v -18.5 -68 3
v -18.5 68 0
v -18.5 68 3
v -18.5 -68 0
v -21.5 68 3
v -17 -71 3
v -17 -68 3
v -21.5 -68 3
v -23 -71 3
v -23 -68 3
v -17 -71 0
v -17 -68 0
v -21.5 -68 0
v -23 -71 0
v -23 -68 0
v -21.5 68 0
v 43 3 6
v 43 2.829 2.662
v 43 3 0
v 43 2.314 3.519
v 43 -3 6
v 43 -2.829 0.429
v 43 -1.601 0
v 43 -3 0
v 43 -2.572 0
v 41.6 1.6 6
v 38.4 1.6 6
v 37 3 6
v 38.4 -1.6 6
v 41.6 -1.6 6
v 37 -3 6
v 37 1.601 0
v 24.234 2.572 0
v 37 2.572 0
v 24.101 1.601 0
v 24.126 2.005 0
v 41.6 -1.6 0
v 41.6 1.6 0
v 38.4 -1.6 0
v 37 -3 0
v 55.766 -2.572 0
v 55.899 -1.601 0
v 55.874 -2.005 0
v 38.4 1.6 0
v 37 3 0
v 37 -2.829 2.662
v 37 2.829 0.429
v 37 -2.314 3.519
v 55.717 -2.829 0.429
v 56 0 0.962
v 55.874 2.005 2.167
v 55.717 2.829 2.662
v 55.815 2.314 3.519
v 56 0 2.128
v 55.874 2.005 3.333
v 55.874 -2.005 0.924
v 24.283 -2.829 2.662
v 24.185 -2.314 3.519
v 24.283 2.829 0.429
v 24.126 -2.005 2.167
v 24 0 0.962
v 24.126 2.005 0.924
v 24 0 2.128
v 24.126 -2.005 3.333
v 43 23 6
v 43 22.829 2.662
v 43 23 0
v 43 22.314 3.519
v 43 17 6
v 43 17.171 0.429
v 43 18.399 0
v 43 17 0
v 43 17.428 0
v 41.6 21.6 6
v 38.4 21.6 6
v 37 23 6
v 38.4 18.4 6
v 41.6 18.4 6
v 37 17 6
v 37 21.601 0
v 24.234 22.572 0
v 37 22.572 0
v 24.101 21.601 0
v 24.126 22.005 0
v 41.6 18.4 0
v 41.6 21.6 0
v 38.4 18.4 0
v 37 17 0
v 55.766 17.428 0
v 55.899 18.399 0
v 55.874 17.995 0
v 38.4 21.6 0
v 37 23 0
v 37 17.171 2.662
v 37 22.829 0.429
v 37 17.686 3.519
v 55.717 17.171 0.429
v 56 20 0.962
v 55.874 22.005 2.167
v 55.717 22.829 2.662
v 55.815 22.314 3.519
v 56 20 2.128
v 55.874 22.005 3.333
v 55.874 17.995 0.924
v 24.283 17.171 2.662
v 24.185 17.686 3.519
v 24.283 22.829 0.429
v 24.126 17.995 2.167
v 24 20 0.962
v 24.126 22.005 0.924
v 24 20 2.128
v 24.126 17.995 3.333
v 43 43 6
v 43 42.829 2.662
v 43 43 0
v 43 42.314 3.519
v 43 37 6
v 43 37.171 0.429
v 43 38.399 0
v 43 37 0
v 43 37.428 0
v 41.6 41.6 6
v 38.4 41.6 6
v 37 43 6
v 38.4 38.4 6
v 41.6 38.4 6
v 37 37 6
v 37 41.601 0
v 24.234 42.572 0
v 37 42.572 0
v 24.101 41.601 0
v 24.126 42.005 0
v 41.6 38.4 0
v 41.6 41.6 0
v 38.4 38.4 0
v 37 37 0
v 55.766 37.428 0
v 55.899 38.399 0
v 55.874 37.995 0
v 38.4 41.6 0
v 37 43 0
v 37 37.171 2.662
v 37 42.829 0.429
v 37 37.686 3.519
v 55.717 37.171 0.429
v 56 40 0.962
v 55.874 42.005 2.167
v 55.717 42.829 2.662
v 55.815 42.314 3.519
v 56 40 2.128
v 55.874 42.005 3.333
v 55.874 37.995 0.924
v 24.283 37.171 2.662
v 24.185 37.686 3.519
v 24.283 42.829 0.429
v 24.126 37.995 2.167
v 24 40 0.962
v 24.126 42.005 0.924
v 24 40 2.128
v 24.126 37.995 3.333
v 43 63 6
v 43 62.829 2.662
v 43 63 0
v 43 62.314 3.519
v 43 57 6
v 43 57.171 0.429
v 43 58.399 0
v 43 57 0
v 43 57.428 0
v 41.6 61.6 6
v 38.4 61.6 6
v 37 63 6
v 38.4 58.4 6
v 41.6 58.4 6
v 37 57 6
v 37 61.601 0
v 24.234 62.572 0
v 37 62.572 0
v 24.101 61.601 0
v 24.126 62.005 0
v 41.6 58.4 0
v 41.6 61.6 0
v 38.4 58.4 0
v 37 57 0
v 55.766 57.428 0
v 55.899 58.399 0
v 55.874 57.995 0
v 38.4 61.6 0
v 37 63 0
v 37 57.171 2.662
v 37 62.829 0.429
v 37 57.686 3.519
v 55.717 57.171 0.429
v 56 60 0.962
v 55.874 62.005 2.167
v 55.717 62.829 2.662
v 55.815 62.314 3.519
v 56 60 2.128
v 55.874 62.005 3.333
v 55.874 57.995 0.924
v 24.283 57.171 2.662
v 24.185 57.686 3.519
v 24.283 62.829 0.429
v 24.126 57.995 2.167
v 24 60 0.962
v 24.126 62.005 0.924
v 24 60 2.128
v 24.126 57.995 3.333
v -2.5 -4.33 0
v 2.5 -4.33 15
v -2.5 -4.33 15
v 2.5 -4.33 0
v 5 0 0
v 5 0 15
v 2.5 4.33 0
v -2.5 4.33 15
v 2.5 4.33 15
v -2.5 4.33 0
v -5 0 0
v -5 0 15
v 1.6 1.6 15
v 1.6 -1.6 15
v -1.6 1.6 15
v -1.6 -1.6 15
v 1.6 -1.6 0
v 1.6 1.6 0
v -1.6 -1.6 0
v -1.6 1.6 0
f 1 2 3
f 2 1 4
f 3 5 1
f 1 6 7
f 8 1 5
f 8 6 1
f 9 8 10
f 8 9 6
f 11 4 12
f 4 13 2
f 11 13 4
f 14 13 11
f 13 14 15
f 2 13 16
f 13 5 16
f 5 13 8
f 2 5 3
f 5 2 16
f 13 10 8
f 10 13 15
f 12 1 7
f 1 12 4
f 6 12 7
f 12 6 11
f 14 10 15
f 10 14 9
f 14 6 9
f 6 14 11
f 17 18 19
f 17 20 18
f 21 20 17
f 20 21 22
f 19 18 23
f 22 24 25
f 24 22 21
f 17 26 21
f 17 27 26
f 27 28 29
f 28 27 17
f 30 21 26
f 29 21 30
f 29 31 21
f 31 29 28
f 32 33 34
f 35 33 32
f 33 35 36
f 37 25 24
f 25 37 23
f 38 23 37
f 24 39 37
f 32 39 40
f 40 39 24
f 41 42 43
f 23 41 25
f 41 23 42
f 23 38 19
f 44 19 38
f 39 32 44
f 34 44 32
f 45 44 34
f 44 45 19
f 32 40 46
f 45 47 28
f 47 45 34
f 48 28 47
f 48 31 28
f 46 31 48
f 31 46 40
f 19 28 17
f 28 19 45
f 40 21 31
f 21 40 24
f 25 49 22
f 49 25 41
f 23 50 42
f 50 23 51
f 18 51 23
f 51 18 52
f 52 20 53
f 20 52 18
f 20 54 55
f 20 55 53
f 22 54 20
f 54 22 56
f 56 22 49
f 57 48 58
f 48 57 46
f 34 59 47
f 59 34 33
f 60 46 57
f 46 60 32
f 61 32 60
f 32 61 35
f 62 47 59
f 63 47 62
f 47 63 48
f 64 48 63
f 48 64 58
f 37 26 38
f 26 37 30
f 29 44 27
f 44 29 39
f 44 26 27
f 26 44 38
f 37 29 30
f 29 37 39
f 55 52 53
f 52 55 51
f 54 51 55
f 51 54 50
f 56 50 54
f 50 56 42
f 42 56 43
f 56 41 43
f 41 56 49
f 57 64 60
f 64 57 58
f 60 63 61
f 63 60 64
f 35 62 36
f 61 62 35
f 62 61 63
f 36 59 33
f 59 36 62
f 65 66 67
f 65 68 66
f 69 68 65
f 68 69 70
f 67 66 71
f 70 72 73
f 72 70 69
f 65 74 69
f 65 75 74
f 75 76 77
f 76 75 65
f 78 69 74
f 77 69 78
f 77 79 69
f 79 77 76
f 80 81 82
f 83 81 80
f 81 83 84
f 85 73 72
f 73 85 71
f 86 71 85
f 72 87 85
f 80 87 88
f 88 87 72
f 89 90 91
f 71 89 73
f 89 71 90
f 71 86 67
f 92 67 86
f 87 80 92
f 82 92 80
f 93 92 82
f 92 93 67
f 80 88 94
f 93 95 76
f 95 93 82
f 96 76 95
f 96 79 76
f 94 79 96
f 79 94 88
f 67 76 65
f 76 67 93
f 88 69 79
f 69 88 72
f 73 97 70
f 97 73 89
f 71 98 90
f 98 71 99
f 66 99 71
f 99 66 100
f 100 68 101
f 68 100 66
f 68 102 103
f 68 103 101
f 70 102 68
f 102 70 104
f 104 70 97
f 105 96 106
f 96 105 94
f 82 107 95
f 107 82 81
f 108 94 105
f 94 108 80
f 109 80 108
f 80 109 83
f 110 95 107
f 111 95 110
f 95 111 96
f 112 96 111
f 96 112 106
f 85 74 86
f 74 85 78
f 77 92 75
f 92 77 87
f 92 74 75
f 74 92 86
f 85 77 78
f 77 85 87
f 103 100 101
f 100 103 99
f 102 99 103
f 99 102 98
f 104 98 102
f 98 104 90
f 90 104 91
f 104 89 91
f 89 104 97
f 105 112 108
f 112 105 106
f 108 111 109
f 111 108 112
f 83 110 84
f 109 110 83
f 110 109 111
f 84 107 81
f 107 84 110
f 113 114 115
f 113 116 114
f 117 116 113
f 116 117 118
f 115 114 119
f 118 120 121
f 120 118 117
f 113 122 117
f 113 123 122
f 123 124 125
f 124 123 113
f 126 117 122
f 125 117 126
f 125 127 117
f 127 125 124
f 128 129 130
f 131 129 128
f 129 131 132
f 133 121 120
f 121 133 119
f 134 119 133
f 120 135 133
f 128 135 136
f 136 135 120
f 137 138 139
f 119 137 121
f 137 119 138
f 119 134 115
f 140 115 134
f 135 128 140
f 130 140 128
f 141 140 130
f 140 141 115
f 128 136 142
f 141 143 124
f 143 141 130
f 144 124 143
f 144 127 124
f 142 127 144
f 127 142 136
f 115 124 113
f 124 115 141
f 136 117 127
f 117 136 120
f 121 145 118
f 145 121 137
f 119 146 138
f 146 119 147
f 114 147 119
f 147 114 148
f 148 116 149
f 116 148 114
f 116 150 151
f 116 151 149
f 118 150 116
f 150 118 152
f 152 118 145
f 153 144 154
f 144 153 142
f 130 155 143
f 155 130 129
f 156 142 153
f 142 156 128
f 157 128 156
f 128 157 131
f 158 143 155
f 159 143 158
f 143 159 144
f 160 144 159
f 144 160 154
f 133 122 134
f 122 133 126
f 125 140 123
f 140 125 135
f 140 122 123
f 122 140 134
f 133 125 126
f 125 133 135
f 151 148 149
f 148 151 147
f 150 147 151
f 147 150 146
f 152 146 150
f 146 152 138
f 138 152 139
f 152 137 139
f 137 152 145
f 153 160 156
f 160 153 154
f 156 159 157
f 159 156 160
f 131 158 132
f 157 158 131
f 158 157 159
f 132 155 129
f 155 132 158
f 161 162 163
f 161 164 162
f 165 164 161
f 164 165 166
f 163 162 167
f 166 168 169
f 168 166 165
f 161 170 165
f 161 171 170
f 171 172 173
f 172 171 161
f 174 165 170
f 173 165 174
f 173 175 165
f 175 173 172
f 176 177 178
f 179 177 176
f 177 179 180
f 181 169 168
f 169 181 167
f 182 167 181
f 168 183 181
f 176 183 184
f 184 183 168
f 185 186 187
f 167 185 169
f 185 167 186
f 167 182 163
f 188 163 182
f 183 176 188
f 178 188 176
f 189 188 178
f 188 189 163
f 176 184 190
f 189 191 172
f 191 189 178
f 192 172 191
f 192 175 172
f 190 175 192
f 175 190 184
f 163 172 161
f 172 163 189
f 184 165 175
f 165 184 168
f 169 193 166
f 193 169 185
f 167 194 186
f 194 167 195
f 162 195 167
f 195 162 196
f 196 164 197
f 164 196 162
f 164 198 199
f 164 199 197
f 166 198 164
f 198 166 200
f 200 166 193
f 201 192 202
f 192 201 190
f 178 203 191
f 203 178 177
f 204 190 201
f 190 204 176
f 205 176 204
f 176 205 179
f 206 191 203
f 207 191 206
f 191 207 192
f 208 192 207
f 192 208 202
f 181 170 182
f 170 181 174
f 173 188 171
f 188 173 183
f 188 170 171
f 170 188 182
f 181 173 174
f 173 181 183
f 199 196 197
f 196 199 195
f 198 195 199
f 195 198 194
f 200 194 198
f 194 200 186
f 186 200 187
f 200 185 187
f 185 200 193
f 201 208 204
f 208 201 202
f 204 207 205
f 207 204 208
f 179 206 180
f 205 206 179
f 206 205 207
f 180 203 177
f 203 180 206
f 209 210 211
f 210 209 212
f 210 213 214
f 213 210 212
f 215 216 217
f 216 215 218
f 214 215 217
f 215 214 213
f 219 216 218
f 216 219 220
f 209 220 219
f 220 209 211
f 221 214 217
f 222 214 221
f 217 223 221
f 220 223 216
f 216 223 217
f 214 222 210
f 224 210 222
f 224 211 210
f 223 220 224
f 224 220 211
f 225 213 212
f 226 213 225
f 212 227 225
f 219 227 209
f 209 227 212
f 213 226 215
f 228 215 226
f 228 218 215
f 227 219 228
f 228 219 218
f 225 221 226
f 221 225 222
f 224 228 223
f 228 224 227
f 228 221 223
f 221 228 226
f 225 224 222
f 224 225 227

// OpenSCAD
$fn=4;
ts=3;
tl=1;

//шприц
di=40;//диаметр внутри
li=136;//длина внутри
hv=9;//зазор между винтами
ugol=59;
from=0;



translate([-20,0,0])ersh_n();
module ersh_n(){
   // dd=6;
    translate([0,-li/2,0]){
        //translate([0,li,pow(3,1/2)*ts/4])rotate([90,45,0])cylinder(li,ts/2,ts/2); 
        translate([0,li/2,ts/2])cube([ts,li,ts],true);
        translate([0,-3/2,ts/2])cube([2*ts,3,ts],true);
    }

}
//kit();
module kit(){

    translate([40,0,0])vint_2(-ugol, 2*ts,di*0.8);
    translate([40,15,0])vint_2(-ugol, 2*ts, di*0.85);
    translate([40,30,0])vint_2(-ugol, 2*ts, di*0.9);
    translate([40,45,0])vint_2(-ugol, 2*ts, di*0.95);
    translate([40,60,0])vint_2(-ugol, 2*ts, di*0.95);
    translate([40,75,0])vint_2(-ugol, 2*ts, di*0.95);
    translate([40,-15,0])vint_2(-ugol, 2*ts, di);
    translate([40,-30,0])vint_2(-ugol, 2*ts, di);

}
translate([40,0,0])vint_2(-ugol, 2*ts, di*0.8);
translate([40,20,0])vint_2(-ugol, 2*ts, di*0.8);
translate([40,40,0])vint_2(-ugol, 2*ts, di*0.8);
translate([40,60,0])vint_2(-ugol, 2*ts, di*0.8);
//translate([40,0,0])vint_n(45, 3*ts);
module vint_2(aa, rr, ll){ //угол, размер(ширина), сдвиг от центра, длина лопостей, старт
    asd=from*ll;
    hh=hv/2+cos(aa)*rr;
    $fn=50;
    if(from==0){
        vint_n(aa, rr, ll);
    }else{
        intersection(){
            vint_n(aa, rr, ll);
            cylinder(20,asd/2,asd/2);
        }
        intersection(){
            difference(){
                cylinder(20,ll/2,ll/2);
                translate([0,0,-1])cylinder(22,asd/2,asd/2);
            }
            vint_n(-aa, rr, ll);
        }
        intersection(){
            difference(){
                translate([0,0,0])cylinder(hh,asd/2+tl/2,asd/2+tl/2);
                translate([0,0,-1])cylinder(22,asd/2-tl/2,asd/2-tl/2);
            }
            translate([0,0,hh/2])cube([di,rr,hh],true);
        }
    }
    
}
//vint_n(-ugol, 3*ts, di);
module vint_n(aa, rr, ll){ //угол, размер(ширина),  длина лопостей
    $fn=4;
    ddd=0.2;
    hh=hv/2+cos(aa)*rr;
    sdv=rr/2-cos(aa)*rr/2;
    intersection(){
        difference(){
            union(){
                //cylinder(hh,ts,ts);
                translate([0,0,rr/2])cube([ts*2,ts*2,rr],true);
                translate([di/4,0,rr/2-sdv])rotate([aa,0,0])cube([di/2,tl,rr],true);
                translate([-(di/4),0,rr/2-sdv])rotate([-aa,0,0])cube([di/2,tl,rr],true);
            }
            //translate([0,0,-1])cylinder(2*hh,ts/2+ddd,ts/2+ddd);
            translate([0,0,rr/2-1])cube([ts+ddd,ts+ddd,rr*2],true);
        }
        union(){
            $fn=50;
            cylinder(20,ll/2,ll/2); 
        }
    }
}

prh();
module prh(){
    ddd=0.2;
    $fn=6;
    difference(){
        cylinder(15,5,5);
        cube([ts+ddd,ts+ddd,40],true);
    }
}
